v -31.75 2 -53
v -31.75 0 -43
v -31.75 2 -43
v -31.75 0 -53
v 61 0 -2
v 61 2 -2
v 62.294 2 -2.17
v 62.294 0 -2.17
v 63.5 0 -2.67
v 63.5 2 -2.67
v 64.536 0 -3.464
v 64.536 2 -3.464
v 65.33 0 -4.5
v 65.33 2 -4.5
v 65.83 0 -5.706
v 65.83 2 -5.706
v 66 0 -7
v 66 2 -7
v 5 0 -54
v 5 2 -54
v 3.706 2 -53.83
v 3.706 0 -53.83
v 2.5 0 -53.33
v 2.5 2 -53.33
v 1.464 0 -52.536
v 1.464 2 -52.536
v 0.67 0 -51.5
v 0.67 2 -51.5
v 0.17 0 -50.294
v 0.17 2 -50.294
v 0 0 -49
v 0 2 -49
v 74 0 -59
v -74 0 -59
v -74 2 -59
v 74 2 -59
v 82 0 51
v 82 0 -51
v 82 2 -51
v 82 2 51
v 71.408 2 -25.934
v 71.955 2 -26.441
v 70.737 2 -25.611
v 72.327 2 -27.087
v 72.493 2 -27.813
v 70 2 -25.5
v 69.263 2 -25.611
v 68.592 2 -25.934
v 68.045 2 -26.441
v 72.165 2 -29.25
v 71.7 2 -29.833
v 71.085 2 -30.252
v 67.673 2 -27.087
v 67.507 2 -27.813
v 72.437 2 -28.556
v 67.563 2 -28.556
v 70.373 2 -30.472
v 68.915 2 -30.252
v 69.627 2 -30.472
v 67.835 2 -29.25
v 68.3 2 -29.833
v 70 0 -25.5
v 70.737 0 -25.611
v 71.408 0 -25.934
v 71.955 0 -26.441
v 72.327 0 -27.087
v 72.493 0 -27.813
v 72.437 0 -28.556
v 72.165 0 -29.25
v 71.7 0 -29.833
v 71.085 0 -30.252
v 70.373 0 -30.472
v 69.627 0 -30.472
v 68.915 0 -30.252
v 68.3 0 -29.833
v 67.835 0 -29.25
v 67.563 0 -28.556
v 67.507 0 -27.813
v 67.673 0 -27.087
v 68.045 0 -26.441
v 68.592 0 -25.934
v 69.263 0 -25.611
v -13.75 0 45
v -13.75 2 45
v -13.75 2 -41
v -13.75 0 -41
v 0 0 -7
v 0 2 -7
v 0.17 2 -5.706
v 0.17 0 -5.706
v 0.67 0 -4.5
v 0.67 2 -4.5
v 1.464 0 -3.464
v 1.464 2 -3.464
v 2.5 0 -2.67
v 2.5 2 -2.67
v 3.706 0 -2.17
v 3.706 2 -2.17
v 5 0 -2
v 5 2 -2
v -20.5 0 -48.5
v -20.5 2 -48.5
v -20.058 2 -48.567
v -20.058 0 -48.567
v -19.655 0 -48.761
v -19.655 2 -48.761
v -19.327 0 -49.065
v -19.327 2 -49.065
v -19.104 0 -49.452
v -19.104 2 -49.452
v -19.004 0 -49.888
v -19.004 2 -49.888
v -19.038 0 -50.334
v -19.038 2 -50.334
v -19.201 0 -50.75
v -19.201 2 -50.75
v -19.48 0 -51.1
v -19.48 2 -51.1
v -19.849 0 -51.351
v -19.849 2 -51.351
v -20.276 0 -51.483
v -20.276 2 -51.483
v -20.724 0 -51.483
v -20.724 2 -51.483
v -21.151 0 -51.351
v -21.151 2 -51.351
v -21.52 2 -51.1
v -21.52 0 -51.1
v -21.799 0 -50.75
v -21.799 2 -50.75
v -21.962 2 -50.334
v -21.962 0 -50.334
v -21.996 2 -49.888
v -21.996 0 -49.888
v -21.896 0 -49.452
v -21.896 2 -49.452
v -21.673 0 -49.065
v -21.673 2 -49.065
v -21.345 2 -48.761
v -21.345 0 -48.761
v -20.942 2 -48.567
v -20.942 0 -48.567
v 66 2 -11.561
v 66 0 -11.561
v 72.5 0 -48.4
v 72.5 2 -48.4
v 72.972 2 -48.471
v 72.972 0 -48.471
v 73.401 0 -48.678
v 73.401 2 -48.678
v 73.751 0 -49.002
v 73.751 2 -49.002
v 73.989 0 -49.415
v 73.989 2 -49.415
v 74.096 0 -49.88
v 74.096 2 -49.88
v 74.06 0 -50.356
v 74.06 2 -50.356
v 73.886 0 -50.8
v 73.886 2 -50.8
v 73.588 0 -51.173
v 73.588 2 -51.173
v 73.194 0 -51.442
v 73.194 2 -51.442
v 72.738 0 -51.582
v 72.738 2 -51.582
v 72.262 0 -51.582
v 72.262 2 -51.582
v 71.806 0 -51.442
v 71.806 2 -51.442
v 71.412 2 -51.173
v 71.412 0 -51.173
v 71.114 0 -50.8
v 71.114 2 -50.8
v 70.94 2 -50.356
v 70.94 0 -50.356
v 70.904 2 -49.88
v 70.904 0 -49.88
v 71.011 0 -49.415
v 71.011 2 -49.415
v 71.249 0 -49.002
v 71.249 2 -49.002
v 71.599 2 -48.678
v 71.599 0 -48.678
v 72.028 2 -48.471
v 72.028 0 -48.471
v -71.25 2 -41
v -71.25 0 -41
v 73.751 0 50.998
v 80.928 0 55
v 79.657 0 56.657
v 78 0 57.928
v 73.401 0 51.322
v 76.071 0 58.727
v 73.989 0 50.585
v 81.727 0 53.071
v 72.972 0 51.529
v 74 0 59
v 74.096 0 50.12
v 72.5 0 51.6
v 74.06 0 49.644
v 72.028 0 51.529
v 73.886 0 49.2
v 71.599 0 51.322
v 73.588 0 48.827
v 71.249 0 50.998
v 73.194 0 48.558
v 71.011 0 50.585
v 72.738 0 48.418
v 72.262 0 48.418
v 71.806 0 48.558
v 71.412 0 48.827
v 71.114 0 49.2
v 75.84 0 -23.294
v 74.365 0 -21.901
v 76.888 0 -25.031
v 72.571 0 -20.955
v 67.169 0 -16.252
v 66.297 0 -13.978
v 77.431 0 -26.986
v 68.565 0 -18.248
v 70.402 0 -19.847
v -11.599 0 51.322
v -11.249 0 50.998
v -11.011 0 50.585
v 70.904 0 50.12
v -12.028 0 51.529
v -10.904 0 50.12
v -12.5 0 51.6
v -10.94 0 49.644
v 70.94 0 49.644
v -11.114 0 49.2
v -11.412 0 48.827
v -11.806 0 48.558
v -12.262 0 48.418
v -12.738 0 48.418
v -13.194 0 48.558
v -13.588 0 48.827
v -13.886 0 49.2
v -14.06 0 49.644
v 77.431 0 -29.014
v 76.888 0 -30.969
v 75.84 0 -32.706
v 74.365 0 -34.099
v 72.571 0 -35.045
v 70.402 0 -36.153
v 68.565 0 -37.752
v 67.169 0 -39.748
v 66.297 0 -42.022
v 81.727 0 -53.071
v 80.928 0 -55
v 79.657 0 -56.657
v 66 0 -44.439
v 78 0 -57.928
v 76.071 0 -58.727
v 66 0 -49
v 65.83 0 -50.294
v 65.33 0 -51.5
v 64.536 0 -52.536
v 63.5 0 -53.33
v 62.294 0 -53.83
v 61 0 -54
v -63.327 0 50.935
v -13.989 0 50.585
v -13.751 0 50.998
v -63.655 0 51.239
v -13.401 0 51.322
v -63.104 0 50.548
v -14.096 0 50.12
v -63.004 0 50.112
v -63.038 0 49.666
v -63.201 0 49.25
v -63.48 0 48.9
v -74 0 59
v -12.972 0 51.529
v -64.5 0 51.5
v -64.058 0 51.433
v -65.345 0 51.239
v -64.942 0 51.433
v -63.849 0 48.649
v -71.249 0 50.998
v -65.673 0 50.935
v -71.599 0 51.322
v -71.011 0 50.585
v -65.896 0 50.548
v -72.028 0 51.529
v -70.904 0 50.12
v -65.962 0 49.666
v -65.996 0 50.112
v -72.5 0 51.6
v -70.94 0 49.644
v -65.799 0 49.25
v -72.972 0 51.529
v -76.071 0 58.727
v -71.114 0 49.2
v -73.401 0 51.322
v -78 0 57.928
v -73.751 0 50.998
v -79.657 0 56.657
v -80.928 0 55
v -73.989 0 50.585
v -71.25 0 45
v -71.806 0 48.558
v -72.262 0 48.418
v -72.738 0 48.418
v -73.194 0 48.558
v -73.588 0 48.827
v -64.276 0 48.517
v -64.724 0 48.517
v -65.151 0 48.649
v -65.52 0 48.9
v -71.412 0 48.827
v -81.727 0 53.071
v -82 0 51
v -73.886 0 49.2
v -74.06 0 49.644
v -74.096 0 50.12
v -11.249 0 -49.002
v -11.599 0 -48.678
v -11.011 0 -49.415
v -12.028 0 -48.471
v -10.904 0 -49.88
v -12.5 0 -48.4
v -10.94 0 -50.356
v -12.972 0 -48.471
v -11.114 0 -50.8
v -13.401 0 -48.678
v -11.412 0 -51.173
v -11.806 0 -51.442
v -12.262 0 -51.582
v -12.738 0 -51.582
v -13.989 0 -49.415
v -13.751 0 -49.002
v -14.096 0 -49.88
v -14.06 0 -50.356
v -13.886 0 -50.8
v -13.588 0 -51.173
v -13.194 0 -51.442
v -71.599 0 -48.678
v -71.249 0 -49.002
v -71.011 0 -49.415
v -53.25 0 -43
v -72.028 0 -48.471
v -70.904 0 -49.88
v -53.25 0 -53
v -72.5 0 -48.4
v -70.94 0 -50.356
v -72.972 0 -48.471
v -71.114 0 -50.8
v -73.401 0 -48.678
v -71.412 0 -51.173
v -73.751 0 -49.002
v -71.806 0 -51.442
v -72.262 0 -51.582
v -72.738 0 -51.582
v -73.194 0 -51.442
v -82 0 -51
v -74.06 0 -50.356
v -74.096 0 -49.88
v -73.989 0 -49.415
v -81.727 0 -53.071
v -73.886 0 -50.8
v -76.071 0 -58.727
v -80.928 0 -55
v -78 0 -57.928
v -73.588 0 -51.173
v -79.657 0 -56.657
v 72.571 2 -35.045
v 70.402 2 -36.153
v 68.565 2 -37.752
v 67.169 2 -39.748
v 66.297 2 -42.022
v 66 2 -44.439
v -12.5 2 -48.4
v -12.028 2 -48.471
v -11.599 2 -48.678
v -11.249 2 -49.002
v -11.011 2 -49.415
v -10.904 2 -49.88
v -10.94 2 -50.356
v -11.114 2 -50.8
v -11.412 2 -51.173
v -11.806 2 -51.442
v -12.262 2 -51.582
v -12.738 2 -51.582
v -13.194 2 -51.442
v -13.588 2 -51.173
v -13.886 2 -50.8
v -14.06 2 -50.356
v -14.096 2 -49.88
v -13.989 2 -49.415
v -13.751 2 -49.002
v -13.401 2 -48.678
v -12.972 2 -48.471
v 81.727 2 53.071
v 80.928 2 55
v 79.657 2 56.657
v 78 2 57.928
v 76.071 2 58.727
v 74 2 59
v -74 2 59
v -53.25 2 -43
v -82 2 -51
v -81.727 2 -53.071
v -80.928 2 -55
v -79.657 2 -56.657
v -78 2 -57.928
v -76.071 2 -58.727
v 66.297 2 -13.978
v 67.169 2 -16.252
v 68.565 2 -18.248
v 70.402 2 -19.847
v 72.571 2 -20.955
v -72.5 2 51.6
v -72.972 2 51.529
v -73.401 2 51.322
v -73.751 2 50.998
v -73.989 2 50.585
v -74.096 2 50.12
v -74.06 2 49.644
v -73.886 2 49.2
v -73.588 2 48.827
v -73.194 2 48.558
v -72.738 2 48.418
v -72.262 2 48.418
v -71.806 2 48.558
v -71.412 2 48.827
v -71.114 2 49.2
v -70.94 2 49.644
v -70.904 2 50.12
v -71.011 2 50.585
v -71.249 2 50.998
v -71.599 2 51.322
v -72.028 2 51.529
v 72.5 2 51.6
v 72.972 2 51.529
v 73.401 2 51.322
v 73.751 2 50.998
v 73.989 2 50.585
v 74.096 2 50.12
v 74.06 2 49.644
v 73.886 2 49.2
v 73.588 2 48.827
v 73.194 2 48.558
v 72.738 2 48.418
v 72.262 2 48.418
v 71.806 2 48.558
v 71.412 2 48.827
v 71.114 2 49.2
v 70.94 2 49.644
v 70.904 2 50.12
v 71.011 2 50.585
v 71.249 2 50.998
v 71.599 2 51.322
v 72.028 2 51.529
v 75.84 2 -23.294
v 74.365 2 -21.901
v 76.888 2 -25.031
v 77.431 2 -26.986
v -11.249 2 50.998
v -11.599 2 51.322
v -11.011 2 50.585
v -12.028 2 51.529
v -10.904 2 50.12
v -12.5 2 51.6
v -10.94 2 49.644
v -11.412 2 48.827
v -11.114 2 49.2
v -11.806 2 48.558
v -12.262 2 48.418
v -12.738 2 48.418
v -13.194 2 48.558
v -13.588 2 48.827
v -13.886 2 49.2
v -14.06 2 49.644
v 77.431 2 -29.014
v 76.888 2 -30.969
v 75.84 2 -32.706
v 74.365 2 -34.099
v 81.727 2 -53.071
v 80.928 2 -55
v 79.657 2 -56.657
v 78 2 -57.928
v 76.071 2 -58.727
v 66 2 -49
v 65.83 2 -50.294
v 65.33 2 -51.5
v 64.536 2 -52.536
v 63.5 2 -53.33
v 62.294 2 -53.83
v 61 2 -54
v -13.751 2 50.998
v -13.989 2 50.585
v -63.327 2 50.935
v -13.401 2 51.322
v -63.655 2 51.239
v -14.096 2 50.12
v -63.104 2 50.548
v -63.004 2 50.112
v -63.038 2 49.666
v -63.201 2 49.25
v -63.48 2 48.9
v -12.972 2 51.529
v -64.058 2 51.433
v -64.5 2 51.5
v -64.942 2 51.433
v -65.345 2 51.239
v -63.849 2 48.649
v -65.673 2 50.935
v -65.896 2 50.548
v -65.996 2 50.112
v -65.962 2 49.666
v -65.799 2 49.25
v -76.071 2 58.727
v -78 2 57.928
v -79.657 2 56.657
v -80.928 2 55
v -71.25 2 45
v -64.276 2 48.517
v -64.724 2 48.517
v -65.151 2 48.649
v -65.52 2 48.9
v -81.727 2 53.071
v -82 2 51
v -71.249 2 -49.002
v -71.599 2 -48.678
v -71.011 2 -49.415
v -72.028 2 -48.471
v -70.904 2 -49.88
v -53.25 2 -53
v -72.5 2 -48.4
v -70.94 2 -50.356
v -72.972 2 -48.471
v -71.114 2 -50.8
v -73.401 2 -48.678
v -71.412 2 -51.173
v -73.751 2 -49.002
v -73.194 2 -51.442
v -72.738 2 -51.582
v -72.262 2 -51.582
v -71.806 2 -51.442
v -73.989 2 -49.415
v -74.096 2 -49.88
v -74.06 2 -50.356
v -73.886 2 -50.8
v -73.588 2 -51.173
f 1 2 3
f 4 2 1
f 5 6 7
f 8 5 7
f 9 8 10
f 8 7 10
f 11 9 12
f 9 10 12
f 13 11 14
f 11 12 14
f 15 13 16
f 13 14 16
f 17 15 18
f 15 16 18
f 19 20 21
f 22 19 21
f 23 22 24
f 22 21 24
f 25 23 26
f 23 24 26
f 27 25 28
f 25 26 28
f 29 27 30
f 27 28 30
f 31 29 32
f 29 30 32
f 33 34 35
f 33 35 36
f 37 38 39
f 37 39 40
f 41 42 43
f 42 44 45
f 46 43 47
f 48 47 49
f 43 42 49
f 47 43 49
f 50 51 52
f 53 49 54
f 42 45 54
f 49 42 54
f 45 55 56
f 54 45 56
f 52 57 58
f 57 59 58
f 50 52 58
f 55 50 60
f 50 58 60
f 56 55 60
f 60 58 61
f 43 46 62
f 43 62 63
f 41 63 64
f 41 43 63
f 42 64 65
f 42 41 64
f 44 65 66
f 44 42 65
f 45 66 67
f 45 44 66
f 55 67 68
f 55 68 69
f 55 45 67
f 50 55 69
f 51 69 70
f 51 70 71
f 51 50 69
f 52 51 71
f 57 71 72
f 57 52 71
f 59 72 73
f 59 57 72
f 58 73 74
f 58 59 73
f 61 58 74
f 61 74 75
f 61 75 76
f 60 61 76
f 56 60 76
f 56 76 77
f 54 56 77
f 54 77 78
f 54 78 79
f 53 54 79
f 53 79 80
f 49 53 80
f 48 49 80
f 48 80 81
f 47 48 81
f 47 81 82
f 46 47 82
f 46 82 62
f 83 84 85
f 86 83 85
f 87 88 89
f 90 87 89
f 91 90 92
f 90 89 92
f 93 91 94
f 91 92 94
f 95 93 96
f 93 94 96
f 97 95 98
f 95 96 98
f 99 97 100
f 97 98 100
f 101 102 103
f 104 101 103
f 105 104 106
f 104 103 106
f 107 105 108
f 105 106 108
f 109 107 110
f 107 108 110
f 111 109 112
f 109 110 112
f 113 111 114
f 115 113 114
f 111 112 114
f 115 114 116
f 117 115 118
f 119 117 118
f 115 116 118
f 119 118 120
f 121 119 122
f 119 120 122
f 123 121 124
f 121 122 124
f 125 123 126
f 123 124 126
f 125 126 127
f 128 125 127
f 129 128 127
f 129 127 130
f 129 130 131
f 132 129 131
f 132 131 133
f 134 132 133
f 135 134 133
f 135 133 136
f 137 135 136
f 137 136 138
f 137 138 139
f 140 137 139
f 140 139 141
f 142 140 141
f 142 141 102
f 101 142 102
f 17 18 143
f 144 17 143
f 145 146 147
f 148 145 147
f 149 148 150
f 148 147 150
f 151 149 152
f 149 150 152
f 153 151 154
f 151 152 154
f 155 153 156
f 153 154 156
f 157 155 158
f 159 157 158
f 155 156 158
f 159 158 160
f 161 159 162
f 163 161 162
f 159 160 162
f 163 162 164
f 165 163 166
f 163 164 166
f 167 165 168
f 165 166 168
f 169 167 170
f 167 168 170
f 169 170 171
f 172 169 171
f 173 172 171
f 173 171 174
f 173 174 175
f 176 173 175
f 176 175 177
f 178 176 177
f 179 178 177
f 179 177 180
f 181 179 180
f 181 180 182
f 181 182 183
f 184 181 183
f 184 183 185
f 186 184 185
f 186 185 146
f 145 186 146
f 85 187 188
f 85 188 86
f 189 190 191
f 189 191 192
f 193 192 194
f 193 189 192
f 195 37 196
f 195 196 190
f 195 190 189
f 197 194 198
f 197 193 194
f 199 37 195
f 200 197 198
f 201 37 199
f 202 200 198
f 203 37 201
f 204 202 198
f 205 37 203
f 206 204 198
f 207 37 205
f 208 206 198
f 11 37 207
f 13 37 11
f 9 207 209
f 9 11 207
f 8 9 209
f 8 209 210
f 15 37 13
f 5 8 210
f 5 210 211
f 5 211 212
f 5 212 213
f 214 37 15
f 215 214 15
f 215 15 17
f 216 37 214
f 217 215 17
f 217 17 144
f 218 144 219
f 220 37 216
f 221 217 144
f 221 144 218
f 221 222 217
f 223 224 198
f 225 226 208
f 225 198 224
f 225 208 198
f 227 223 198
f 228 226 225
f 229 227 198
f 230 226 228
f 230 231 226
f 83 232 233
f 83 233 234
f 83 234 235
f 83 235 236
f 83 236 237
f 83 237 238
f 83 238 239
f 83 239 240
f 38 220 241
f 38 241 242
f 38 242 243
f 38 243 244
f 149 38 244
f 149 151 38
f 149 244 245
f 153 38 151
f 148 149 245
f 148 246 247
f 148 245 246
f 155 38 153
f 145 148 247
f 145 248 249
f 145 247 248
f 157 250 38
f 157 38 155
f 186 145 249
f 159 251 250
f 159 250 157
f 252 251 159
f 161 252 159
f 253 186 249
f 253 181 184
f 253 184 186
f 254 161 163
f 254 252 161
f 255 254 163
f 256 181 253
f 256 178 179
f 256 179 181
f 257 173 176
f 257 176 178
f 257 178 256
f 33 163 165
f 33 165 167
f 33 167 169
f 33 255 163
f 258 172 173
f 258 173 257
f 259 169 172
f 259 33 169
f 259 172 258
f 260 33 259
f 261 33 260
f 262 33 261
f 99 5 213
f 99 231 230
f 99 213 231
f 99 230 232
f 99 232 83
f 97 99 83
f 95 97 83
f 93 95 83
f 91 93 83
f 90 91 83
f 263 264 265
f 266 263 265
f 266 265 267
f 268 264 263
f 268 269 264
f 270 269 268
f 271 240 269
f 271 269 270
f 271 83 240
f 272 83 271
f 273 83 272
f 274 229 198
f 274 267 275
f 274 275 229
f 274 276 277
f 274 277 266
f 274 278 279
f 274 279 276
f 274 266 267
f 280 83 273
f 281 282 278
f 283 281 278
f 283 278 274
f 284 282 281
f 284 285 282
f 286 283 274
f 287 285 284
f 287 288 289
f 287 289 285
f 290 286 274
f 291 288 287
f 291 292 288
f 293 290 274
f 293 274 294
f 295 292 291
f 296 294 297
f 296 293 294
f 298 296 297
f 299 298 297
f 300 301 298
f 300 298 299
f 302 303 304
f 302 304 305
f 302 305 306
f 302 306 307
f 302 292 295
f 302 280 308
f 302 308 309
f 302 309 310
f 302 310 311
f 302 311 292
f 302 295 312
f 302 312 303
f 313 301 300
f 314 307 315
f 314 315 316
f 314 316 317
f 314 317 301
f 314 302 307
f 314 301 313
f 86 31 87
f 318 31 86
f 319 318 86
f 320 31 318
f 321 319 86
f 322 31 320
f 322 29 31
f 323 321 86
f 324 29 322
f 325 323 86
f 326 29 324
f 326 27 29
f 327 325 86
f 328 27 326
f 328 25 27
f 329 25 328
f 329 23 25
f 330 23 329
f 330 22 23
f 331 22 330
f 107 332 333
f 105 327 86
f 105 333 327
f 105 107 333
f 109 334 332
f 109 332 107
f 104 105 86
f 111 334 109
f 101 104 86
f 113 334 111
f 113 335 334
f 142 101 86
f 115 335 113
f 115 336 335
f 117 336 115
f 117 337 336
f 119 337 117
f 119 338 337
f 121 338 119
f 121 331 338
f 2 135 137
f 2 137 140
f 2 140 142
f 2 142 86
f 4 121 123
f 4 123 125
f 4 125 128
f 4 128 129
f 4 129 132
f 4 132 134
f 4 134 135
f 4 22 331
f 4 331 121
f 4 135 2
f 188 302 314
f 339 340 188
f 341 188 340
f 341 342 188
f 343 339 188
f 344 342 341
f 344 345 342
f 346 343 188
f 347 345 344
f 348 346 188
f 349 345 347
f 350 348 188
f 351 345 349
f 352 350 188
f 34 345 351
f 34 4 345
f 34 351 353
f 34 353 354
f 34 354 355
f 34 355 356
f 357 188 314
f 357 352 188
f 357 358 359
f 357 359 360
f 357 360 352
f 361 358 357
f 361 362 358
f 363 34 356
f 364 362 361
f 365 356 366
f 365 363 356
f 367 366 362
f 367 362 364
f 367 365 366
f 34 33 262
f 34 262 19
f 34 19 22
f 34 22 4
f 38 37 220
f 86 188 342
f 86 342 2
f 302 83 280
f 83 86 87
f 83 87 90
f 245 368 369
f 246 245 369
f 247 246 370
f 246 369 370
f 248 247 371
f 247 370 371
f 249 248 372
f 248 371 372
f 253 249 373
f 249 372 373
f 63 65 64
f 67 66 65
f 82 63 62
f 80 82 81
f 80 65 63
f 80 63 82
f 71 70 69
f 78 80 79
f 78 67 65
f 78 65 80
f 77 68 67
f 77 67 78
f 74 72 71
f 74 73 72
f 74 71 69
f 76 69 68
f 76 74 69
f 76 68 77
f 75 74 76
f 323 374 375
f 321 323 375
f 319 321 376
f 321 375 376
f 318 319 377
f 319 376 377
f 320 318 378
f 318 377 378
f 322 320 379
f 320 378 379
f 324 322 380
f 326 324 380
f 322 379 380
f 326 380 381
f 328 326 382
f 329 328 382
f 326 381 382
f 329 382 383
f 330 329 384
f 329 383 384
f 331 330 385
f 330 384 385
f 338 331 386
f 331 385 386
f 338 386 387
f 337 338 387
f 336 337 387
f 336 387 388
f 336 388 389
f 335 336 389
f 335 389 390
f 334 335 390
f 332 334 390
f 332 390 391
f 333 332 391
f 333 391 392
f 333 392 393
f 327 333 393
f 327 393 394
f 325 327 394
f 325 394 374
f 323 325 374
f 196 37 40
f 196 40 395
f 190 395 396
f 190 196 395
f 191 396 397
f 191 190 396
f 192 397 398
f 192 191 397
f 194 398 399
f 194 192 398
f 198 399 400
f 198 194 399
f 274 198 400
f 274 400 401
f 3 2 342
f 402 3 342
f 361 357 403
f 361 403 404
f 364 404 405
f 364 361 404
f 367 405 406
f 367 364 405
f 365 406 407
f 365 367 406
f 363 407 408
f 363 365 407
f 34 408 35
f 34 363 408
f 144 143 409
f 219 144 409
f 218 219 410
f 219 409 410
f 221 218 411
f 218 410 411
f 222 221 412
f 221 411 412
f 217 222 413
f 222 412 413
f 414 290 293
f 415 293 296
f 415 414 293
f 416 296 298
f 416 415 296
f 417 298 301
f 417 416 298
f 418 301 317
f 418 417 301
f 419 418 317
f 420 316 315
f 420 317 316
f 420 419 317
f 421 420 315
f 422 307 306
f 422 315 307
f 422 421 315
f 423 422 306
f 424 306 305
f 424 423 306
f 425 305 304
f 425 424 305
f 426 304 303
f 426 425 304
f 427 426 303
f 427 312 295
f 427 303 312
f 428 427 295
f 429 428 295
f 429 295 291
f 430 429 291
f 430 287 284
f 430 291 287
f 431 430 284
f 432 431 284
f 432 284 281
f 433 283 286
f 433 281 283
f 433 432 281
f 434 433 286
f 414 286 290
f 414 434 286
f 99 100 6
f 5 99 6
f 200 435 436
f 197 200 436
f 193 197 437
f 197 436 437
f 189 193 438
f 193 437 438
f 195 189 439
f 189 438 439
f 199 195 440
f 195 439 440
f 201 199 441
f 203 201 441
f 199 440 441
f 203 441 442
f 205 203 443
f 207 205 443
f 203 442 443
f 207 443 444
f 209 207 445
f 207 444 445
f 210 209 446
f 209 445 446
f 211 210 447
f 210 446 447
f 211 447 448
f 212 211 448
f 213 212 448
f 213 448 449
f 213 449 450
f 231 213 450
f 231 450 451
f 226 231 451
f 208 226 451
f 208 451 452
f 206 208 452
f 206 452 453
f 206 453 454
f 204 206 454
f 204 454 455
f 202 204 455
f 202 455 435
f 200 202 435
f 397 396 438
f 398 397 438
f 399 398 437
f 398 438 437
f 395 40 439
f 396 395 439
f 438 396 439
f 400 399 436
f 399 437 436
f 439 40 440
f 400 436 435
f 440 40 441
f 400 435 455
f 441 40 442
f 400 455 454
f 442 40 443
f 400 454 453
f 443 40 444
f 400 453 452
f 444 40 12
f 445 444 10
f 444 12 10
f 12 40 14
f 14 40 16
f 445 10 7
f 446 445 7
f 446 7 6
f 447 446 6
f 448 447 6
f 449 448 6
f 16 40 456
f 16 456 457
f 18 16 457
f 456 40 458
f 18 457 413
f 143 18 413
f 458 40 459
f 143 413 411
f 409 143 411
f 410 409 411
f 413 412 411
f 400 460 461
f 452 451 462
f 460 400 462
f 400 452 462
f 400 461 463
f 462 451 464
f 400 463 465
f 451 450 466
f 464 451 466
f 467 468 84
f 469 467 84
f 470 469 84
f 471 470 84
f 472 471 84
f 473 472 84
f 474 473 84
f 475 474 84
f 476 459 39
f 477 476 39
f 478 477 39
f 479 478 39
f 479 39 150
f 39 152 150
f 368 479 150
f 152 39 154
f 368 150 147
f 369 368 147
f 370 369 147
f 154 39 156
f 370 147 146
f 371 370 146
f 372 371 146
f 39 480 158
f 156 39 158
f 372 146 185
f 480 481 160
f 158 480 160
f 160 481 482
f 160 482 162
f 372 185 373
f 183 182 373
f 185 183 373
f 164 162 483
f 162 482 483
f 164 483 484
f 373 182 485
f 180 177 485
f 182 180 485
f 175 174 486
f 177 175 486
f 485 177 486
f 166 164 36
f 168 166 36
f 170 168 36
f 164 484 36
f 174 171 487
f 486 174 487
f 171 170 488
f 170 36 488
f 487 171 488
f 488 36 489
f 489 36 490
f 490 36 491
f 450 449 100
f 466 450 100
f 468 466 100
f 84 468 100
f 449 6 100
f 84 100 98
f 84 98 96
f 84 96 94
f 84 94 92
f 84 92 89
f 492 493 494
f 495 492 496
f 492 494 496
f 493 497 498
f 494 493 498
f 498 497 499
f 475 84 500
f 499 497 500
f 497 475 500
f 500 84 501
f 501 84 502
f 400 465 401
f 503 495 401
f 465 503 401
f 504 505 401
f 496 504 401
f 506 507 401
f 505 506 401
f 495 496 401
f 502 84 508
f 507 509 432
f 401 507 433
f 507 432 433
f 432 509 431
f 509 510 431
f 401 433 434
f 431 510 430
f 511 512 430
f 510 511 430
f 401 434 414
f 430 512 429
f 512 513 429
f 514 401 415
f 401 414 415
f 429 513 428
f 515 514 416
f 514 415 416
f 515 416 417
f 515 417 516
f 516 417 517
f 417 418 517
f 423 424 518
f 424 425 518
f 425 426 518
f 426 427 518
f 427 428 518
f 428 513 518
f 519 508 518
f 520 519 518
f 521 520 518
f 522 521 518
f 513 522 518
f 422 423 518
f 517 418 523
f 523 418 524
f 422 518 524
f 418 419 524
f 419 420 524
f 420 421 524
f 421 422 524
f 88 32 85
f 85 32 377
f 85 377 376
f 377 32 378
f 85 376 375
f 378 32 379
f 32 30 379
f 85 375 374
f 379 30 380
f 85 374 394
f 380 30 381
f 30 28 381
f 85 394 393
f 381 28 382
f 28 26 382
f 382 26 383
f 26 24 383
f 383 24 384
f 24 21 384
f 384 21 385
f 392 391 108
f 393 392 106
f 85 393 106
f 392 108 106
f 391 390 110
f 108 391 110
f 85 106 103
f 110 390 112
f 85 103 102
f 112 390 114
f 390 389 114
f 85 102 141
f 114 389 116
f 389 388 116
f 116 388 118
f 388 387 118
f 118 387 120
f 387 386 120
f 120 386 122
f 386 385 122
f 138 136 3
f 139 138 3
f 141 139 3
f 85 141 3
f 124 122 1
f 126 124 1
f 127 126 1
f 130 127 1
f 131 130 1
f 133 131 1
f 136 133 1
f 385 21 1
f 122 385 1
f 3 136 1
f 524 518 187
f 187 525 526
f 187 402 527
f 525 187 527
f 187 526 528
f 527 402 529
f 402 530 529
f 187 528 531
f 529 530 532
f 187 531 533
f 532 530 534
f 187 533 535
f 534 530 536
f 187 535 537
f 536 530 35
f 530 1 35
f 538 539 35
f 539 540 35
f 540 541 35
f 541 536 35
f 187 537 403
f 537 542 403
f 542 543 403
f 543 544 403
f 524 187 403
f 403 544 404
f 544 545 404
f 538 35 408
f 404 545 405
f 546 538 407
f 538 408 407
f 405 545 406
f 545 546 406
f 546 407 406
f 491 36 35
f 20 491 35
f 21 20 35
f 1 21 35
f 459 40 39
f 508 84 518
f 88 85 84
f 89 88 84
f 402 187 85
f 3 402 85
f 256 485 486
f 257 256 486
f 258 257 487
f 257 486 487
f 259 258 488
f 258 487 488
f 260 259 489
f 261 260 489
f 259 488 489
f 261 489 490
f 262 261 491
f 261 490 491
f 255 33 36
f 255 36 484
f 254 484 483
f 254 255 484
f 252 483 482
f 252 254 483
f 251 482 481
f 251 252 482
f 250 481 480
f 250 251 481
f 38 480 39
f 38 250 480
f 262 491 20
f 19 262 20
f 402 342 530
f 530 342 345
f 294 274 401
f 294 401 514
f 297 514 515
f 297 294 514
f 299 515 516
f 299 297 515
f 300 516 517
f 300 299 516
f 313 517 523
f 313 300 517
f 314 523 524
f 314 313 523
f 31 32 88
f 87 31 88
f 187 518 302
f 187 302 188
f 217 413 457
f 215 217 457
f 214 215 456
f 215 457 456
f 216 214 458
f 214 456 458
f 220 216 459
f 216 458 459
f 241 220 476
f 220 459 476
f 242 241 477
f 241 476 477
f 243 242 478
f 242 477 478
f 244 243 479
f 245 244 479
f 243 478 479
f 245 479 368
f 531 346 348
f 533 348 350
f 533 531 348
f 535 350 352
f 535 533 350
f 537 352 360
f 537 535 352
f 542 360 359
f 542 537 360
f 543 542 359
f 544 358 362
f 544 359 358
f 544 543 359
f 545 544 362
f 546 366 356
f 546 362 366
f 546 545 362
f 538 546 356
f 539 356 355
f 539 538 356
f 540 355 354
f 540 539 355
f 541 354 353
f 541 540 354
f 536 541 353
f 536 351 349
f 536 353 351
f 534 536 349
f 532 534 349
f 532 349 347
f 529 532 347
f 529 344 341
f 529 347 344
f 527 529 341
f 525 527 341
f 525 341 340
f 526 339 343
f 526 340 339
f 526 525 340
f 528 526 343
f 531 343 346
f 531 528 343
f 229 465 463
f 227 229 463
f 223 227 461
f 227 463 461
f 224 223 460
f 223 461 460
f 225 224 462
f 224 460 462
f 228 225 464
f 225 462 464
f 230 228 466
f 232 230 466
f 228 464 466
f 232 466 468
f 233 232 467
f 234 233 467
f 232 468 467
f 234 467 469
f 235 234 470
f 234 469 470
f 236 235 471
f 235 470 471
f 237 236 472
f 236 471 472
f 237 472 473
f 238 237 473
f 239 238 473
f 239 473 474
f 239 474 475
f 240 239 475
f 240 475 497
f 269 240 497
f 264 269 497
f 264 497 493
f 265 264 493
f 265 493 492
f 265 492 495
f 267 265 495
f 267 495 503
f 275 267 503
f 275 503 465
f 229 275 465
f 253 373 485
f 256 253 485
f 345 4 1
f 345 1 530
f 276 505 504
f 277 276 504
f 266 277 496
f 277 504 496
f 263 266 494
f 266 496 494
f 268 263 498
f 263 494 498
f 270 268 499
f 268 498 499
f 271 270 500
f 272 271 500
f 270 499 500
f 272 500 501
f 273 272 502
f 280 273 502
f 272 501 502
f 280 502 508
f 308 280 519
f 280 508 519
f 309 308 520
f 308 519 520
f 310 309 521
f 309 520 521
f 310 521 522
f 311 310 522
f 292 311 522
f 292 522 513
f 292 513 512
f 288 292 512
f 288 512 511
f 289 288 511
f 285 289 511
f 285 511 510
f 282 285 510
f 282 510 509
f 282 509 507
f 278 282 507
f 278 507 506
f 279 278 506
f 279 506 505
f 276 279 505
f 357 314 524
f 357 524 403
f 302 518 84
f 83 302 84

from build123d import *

# Parameters (mm, degrees)
BOSS_EXTRUDE1_DEPTH = 2
SKETCH2_W           = 57.5
SKETCH2_H           = 86
CUT_EXTRUDE1_DEPTH  = 102.039596199
SKETCH7_R           = 2.5
CUT_EXTRUDE6_DEPTH  = 102.039596199
SKETCH8_R           = 1.6
CUT_EXTRUDE7_DEPTH  = 102.039596199
SKETCH10_R          = 1.6
CUT_EXTRUDE9_DEPTH  = 102.039596199
SKETCH11_W          = 21.5
SKETCH11_H          = 10
CUT_EXTRUDE10_DEPTH = 102.039596199
SKETCH12_R          = 1.5
CUT_EXTRUDE11_DEPTH = 102.039596199


with BuildPart() as part:
    # Sketch1 → Boss-Extrude1 (new body)
    with BuildSketch(Plane(origin=(0, 0, 0), x_dir=(1, 0, 0), z_dir=(0, 1, 0))):
        with BuildLine():
            Line((-74, 59), (74, 59))
            ThreePointArc((74, 59), (79.656854249, 56.656854249), (82, 51))
            Line((82, 51), (82, -51))
            ThreePointArc((82, -51), (79.656854249, -56.656854249), (74, -59))
            Line((74, -59), (-74, -59))
            ThreePointArc((-74, -59), (-79.656854249, -56.656854249), (-82, -51))
            Line((-82, -51), (-82, 51))
            ThreePointArc((-82, 51), (-79.656854249, 56.656854249), (-74, 59))
        make_face()
    extrude(amount=BOSS_EXTRUDE1_DEPTH)

    # Sketch2 → Cut-Extrude1 (cut, through all)
    with BuildSketch(Plane(origin=(0, 2, 0), x_dir=(1, 0, 0), z_dir=(0, 1, 0))):
        with Locations((-42.5, -2)):
            Rectangle(SKETCH2_W, SKETCH2_H)
    extrude(amount=-CUT_EXTRUDE1_DEPTH, mode=Mode.SUBTRACT)

    # Sketch7 → Cut-Extrude6 (cut, through all)
    with BuildSketch(Plane(origin=(0, 2, 0), x_dir=(1, 0, 0), z_dir=(0, 1, 0))):
        with BuildLine():
            Line((0, 49), (0, 7))
            ThreePointArc((0, 7), (1.464466094, 3.464466094), (5, 2))
            Line((5, 2), (61, 2))
            ThreePointArc((61, 2), (64.535533906, 3.464466094), (66, 7))
            Line((66, 7), (66, 11.560717777))
            ThreePointArc((66, 11.560717777), (67.805925486, 17.292832819), (72.571428571, 20.954593333))
            ThreePointArc((72.571428571, 20.954593333), (77.5, 28), (72.571428571, 35.045406667))
            ThreePointArc((72.571428571, 35.045406667), (67.805925486, 38.707167181), (66, 44.439282223))
            Line((66, 44.439282223), (66, 49))
            ThreePointArc((66, 49), (64.535533906, 52.535533906), (61, 54))
            Line((61, 54), (5, 54))
            ThreePointArc((5, 54), (1.464466094, 52.535533906), (0, 49))
        make_face()
        with Locations(Location((70, 28, 0), (0, 0, 270))):
            Circle(SKETCH7_R, mode=Mode.SUBTRACT)
    extrude(amount=-CUT_EXTRUDE6_DEPTH, mode=Mode.SUBTRACT)


with BuildPart() as cut_extrude6_piece_1:
    # of the separate pieces the step leaves, piece 1, a body of its own (cut_extrude6_pieces)
    add(part.part.solids().sort_by_distance((-74, 0, -59))[0])

    # Sketch8 → Cut-Extrude7 (cut, through all)
    with BuildSketch(Plane(origin=(0, 2, 0), x_dir=(1, 0, 0), z_dir=(0, 1, 0))):
        with Locations(Location((72.5, -50, 0), (0, 0, 270))):
            Circle(SKETCH8_R)
        with Locations(Location((72.5, 50, 0), (0, 0, 270))):
            Circle(SKETCH8_R)
    cut_extrude7 = extrude(amount=-CUT_EXTRUDE7_DEPTH, mode=Mode.SUBTRACT)

    # Mirror1: Cut-Extrude7 across plane
    add(cut_extrude7.mirror(Plane(origin=(0, 0, 0), x_dir=(0, 0, 1), z_dir=(1, 0, 0))), mode=Mode.SUBTRACT)

    # Sketch10 → Cut-Extrude9 (cut, through all)
    with BuildSketch(Plane(origin=(0, 2, 0), x_dir=(1, 0, 0), z_dir=(0, 1, 0))):
        with Locations(Location((-12.5, -50, 0), (0, 0, 270))):
            Circle(SKETCH10_R)
        with Locations(Location((-12.5, 50, 0), (0, 0, 270))):
            Circle(SKETCH10_R)
    extrude(amount=-CUT_EXTRUDE9_DEPTH, mode=Mode.SUBTRACT)

    # Sketch11 → Cut-Extrude10 (cut, through all)
    with BuildSketch(Plane(origin=(0, 0, 0), x_dir=(-1, 0, 0), z_dir=(0, -1, 0))):
        with Locations((42.5, 48)):
            Rectangle(SKETCH11_W, SKETCH11_H)
    extrude(amount=-CUT_EXTRUDE10_DEPTH, mode=Mode.SUBTRACT)

    # Sketch12 → Cut-Extrude11 (cut, through all)
    with BuildSketch(Plane(origin=(0, 2, 0), x_dir=(1, 0, 0), z_dir=(0, 1, 0))):
        with Locations(Location((-64.5, -50, 0), (0, 0, 270))):
            Circle(SKETCH12_R)
        with Locations(Location((-20.5, 50, 0), (0, 0, 270))):
            Circle(SKETCH12_R)
    extrude(amount=-CUT_EXTRUDE11_DEPTH, mode=Mode.SUBTRACT)


with BuildPart() as cut_extrude6_piece_2:
    # of the separate pieces the step leaves, piece 2, a body of its own (cut_extrude6_pieces)
    add(part.part.solids().sort_by_distance((70, 0, -25.5))[0])


solid = Compound([cut_extrude6_piece_1.part, cut_extrude6_piece_2.part])
